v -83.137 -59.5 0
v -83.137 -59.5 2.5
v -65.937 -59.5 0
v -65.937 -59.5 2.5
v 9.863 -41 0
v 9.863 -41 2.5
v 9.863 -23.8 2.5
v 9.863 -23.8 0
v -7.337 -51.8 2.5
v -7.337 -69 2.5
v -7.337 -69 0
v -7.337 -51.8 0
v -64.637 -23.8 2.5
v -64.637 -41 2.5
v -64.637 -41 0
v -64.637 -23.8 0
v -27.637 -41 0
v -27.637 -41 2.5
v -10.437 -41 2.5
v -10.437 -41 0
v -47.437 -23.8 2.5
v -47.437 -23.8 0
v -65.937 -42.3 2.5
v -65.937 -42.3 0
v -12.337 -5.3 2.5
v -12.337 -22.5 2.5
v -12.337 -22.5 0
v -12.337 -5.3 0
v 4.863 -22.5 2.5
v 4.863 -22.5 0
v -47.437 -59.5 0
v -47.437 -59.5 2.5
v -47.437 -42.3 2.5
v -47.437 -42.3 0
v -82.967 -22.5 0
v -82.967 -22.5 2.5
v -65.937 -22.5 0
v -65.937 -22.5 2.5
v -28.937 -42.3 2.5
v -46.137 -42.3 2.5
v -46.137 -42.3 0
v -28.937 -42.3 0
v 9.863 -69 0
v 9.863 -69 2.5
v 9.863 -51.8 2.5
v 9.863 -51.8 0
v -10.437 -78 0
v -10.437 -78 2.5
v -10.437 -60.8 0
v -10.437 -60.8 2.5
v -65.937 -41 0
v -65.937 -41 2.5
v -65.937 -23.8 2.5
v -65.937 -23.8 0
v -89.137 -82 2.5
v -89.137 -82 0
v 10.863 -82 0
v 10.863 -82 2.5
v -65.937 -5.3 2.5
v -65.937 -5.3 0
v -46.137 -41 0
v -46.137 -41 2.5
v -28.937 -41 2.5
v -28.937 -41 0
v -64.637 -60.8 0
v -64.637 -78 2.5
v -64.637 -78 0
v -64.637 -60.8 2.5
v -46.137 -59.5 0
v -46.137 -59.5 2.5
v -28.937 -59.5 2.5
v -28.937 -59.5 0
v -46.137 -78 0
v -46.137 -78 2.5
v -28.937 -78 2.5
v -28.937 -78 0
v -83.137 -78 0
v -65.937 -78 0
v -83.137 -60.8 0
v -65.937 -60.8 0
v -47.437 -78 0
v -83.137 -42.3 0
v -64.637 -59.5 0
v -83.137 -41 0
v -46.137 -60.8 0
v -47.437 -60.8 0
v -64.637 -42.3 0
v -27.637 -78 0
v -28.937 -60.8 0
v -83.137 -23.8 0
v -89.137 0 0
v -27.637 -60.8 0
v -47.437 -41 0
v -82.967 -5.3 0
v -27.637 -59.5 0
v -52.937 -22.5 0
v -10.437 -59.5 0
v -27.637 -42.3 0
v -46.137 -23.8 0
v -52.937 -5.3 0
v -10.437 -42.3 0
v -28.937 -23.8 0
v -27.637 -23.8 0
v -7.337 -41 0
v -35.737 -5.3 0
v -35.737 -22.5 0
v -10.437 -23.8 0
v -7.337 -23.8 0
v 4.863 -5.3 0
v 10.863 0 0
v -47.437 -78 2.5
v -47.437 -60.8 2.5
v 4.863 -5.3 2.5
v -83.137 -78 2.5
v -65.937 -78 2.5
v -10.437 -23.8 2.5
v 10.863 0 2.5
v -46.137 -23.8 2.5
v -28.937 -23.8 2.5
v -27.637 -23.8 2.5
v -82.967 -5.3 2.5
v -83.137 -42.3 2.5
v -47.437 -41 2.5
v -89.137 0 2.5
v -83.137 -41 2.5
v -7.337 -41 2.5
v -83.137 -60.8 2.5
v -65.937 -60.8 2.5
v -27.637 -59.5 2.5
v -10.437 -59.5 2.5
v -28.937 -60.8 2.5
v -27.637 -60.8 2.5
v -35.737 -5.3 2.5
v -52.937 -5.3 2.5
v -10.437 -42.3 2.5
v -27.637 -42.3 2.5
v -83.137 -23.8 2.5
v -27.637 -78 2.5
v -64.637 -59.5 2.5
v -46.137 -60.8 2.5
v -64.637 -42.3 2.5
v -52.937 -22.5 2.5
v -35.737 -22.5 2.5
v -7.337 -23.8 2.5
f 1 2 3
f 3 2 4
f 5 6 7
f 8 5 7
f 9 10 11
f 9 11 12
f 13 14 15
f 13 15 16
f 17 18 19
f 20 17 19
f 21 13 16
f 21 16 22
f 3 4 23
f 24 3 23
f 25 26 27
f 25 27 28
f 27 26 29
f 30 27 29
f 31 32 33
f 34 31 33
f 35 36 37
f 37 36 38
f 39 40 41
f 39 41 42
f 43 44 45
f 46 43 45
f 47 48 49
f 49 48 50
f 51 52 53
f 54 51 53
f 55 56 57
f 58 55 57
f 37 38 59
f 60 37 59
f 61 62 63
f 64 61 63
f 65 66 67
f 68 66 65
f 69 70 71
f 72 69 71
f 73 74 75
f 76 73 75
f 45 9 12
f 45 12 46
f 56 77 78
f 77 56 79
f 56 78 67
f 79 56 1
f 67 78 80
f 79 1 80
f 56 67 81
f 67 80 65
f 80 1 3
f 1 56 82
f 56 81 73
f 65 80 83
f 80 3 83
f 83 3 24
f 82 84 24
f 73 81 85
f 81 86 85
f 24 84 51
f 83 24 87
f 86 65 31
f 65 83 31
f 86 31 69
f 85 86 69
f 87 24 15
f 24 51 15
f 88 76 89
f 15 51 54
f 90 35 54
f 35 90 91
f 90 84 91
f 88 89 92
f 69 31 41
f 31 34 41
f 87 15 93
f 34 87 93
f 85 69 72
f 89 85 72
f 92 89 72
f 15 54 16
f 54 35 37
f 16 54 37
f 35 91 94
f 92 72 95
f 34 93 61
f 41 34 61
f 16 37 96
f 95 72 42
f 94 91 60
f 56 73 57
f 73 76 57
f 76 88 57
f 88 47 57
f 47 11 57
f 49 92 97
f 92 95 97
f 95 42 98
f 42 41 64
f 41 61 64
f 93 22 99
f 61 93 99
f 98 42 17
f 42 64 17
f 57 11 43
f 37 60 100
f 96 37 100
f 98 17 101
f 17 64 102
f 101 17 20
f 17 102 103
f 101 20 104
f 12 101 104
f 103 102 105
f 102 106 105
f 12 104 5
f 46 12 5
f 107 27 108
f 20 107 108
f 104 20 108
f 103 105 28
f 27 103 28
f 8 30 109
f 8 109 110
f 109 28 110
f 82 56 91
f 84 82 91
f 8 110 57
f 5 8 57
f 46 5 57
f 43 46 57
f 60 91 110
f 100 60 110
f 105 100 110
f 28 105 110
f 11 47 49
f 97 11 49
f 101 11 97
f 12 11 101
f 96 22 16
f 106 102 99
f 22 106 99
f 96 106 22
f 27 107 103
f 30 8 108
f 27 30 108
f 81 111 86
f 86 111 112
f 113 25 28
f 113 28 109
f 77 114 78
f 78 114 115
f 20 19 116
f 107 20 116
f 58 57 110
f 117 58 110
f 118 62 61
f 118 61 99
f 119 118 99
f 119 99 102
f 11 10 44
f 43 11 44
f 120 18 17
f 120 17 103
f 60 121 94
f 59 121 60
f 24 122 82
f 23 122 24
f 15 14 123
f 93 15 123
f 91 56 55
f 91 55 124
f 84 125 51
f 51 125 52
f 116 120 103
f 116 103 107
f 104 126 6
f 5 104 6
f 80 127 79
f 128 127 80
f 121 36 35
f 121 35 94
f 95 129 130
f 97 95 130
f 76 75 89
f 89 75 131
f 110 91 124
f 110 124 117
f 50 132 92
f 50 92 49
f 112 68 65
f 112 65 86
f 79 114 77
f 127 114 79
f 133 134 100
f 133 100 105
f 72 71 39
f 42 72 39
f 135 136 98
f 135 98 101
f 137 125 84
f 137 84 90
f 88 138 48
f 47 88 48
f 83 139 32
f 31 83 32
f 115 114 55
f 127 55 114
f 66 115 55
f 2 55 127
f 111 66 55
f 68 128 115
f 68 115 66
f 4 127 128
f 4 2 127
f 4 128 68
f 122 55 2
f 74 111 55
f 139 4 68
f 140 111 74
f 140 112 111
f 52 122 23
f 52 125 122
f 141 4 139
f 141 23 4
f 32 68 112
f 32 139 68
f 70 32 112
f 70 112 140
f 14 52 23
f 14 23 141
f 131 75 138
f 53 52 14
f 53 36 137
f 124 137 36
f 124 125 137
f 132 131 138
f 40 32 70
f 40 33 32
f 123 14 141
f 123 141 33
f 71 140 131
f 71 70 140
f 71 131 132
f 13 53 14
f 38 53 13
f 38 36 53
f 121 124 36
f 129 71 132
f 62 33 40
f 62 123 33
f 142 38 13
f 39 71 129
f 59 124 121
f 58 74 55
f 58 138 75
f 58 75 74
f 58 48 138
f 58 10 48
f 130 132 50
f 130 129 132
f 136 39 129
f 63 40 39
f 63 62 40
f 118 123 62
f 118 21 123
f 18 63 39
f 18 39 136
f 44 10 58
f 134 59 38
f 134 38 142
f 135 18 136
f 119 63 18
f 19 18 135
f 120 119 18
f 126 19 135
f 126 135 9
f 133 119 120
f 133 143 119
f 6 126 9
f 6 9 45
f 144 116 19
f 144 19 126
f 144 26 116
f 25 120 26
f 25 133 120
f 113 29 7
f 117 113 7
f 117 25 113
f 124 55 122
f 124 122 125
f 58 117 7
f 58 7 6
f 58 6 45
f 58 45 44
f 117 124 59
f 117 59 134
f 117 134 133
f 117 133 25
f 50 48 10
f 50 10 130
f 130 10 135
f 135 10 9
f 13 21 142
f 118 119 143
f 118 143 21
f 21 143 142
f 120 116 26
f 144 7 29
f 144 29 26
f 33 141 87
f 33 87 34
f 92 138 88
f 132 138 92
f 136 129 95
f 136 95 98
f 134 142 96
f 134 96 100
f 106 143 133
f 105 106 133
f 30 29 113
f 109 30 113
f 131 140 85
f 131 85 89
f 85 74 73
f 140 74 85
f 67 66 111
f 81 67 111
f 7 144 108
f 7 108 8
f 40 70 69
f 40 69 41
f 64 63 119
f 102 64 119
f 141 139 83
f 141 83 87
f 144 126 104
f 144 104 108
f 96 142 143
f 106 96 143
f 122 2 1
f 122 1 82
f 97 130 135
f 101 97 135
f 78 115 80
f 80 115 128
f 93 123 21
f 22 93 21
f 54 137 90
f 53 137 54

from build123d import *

# Parameters (mm, degrees)
F0_W      = 100
F0_H      = 82
F1_DEPTH  = 2.5
F2_W      = 17.2
F2_H      = 17.2
F3_DEPTH  = 25
F2_W_2    = 17.030713
F4_DEPTH  = 25
F5_W      = 17.2
F5_H      = 17.2
F6_DEPTH  = 25
F7_W      = 17.2
F7_H      = 17.2
F8_DEPTH  = 25
F9_W      = 17.2
F9_H      = 17.2
F10_DEPTH = 25
F11_W     = 17.2
F11_H     = 17.2
F12_DEPTH = 25
F13_W     = 17.2
F13_H     = 17.2
F14_DEPTH = 25
F15_W     = 17.2
F15_H     = 17.2
F16_DEPTH = 25


with BuildPart() as f1:
    # F0 (on Top) → F1 (new body)
    with BuildSketch(Plane.XY):
        with Locations((-39.136762, -41)):
            Rectangle(F0_W, F0_H)
    extrude(amount=F1_DEPTH)

    # F2 (on face) → F3 (cut)
    with BuildSketch(Plane.XY.offset(2.5)):
        with Locations((-74.536762, -69.4)):
            Rectangle(F2_W, F2_H)
    extrude(amount=-F3_DEPTH, mode=Mode.SUBTRACT)

    # F2 (on face) → F4 (cut)
    with BuildSketch(Plane.XY.offset(2.5)):
        with Locations((-74.536762, -69.4)):
            Rectangle(F2_W, F2_H)
        with Locations((-74.536762, -50.9)):
            Rectangle(F2_W, F2_H)
        with Locations((-74.536762, -32.4)):
            Rectangle(F2_W, F2_H)
        with Locations((-74.452118, -13.9)):
            Rectangle(F2_W_2, F2_H)
    extrude(amount=-F4_DEPTH, mode=Mode.SUBTRACT)

    # F5 (on face) → F6 (cut)
    with BuildSketch(Plane.XY.offset(2.5)):
        with Locations((-56.036762, -69.4)):
            Rectangle(F5_W, F5_H)
        with Locations((-37.536762, -69.4)):
            Rectangle(F5_W, F5_H)
        with Locations((-19.036762, -69.4)):
            Rectangle(F5_W, F5_H)
    extrude(amount=-F6_DEPTH, mode=Mode.SUBTRACT)

    # F7 (on face) → F8 (cut)
    with BuildSketch(Plane.XY.offset(2.5)):
        with Locations((-56.036762, -50.9)):
            Rectangle(F7_W, F7_H)
        with Locations((-56.036762, -32.4)):
            Rectangle(F7_W, F7_H)
        with Locations((-37.536762, -50.9)):
            Rectangle(F7_W, F7_H)
        with Locations((-37.536762, -32.4)):
            Rectangle(F7_W, F7_H)
    extrude(amount=-F8_DEPTH, mode=Mode.SUBTRACT)

    # F9 (on face) → F10 (cut)
    with BuildSketch(Plane.XY.offset(2.5)):
        with Locations((-19.036762, -50.9)):
            Rectangle(F9_W, F9_H)
        with Locations((-19.036762, -32.4)):
            Rectangle(F9_W, F9_H)
    extrude(amount=-F10_DEPTH, mode=Mode.SUBTRACT)

    # F11 (on face) → F12 (cut)
    with BuildSketch(Plane.XY.offset(2.5)):
        with Locations((1.263238, -60.4)):
            Rectangle(F11_W, F11_H)
        with Locations((1.263238, -32.4)):
            Rectangle(F11_W, F11_H)
    extrude(amount=-F12_DEPTH, mode=Mode.SUBTRACT)

    # F13 (on face) → F14 (cut)
    with BuildSketch(Plane.XY.offset(2.5)):
        with Locations((-44.336762, -13.9)):
            Rectangle(F13_W, F13_H)
    extrude(amount=-F14_DEPTH, mode=Mode.SUBTRACT)

    # F15 (on face) → F16 (cut)
    with BuildSketch(Plane.XY.offset(2.5)):
        with Locations((-3.736762, -13.9)):
            Rectangle(F15_W, F15_H)
    extrude(amount=-F16_DEPTH, mode=Mode.SUBTRACT)


solid = f1.part
